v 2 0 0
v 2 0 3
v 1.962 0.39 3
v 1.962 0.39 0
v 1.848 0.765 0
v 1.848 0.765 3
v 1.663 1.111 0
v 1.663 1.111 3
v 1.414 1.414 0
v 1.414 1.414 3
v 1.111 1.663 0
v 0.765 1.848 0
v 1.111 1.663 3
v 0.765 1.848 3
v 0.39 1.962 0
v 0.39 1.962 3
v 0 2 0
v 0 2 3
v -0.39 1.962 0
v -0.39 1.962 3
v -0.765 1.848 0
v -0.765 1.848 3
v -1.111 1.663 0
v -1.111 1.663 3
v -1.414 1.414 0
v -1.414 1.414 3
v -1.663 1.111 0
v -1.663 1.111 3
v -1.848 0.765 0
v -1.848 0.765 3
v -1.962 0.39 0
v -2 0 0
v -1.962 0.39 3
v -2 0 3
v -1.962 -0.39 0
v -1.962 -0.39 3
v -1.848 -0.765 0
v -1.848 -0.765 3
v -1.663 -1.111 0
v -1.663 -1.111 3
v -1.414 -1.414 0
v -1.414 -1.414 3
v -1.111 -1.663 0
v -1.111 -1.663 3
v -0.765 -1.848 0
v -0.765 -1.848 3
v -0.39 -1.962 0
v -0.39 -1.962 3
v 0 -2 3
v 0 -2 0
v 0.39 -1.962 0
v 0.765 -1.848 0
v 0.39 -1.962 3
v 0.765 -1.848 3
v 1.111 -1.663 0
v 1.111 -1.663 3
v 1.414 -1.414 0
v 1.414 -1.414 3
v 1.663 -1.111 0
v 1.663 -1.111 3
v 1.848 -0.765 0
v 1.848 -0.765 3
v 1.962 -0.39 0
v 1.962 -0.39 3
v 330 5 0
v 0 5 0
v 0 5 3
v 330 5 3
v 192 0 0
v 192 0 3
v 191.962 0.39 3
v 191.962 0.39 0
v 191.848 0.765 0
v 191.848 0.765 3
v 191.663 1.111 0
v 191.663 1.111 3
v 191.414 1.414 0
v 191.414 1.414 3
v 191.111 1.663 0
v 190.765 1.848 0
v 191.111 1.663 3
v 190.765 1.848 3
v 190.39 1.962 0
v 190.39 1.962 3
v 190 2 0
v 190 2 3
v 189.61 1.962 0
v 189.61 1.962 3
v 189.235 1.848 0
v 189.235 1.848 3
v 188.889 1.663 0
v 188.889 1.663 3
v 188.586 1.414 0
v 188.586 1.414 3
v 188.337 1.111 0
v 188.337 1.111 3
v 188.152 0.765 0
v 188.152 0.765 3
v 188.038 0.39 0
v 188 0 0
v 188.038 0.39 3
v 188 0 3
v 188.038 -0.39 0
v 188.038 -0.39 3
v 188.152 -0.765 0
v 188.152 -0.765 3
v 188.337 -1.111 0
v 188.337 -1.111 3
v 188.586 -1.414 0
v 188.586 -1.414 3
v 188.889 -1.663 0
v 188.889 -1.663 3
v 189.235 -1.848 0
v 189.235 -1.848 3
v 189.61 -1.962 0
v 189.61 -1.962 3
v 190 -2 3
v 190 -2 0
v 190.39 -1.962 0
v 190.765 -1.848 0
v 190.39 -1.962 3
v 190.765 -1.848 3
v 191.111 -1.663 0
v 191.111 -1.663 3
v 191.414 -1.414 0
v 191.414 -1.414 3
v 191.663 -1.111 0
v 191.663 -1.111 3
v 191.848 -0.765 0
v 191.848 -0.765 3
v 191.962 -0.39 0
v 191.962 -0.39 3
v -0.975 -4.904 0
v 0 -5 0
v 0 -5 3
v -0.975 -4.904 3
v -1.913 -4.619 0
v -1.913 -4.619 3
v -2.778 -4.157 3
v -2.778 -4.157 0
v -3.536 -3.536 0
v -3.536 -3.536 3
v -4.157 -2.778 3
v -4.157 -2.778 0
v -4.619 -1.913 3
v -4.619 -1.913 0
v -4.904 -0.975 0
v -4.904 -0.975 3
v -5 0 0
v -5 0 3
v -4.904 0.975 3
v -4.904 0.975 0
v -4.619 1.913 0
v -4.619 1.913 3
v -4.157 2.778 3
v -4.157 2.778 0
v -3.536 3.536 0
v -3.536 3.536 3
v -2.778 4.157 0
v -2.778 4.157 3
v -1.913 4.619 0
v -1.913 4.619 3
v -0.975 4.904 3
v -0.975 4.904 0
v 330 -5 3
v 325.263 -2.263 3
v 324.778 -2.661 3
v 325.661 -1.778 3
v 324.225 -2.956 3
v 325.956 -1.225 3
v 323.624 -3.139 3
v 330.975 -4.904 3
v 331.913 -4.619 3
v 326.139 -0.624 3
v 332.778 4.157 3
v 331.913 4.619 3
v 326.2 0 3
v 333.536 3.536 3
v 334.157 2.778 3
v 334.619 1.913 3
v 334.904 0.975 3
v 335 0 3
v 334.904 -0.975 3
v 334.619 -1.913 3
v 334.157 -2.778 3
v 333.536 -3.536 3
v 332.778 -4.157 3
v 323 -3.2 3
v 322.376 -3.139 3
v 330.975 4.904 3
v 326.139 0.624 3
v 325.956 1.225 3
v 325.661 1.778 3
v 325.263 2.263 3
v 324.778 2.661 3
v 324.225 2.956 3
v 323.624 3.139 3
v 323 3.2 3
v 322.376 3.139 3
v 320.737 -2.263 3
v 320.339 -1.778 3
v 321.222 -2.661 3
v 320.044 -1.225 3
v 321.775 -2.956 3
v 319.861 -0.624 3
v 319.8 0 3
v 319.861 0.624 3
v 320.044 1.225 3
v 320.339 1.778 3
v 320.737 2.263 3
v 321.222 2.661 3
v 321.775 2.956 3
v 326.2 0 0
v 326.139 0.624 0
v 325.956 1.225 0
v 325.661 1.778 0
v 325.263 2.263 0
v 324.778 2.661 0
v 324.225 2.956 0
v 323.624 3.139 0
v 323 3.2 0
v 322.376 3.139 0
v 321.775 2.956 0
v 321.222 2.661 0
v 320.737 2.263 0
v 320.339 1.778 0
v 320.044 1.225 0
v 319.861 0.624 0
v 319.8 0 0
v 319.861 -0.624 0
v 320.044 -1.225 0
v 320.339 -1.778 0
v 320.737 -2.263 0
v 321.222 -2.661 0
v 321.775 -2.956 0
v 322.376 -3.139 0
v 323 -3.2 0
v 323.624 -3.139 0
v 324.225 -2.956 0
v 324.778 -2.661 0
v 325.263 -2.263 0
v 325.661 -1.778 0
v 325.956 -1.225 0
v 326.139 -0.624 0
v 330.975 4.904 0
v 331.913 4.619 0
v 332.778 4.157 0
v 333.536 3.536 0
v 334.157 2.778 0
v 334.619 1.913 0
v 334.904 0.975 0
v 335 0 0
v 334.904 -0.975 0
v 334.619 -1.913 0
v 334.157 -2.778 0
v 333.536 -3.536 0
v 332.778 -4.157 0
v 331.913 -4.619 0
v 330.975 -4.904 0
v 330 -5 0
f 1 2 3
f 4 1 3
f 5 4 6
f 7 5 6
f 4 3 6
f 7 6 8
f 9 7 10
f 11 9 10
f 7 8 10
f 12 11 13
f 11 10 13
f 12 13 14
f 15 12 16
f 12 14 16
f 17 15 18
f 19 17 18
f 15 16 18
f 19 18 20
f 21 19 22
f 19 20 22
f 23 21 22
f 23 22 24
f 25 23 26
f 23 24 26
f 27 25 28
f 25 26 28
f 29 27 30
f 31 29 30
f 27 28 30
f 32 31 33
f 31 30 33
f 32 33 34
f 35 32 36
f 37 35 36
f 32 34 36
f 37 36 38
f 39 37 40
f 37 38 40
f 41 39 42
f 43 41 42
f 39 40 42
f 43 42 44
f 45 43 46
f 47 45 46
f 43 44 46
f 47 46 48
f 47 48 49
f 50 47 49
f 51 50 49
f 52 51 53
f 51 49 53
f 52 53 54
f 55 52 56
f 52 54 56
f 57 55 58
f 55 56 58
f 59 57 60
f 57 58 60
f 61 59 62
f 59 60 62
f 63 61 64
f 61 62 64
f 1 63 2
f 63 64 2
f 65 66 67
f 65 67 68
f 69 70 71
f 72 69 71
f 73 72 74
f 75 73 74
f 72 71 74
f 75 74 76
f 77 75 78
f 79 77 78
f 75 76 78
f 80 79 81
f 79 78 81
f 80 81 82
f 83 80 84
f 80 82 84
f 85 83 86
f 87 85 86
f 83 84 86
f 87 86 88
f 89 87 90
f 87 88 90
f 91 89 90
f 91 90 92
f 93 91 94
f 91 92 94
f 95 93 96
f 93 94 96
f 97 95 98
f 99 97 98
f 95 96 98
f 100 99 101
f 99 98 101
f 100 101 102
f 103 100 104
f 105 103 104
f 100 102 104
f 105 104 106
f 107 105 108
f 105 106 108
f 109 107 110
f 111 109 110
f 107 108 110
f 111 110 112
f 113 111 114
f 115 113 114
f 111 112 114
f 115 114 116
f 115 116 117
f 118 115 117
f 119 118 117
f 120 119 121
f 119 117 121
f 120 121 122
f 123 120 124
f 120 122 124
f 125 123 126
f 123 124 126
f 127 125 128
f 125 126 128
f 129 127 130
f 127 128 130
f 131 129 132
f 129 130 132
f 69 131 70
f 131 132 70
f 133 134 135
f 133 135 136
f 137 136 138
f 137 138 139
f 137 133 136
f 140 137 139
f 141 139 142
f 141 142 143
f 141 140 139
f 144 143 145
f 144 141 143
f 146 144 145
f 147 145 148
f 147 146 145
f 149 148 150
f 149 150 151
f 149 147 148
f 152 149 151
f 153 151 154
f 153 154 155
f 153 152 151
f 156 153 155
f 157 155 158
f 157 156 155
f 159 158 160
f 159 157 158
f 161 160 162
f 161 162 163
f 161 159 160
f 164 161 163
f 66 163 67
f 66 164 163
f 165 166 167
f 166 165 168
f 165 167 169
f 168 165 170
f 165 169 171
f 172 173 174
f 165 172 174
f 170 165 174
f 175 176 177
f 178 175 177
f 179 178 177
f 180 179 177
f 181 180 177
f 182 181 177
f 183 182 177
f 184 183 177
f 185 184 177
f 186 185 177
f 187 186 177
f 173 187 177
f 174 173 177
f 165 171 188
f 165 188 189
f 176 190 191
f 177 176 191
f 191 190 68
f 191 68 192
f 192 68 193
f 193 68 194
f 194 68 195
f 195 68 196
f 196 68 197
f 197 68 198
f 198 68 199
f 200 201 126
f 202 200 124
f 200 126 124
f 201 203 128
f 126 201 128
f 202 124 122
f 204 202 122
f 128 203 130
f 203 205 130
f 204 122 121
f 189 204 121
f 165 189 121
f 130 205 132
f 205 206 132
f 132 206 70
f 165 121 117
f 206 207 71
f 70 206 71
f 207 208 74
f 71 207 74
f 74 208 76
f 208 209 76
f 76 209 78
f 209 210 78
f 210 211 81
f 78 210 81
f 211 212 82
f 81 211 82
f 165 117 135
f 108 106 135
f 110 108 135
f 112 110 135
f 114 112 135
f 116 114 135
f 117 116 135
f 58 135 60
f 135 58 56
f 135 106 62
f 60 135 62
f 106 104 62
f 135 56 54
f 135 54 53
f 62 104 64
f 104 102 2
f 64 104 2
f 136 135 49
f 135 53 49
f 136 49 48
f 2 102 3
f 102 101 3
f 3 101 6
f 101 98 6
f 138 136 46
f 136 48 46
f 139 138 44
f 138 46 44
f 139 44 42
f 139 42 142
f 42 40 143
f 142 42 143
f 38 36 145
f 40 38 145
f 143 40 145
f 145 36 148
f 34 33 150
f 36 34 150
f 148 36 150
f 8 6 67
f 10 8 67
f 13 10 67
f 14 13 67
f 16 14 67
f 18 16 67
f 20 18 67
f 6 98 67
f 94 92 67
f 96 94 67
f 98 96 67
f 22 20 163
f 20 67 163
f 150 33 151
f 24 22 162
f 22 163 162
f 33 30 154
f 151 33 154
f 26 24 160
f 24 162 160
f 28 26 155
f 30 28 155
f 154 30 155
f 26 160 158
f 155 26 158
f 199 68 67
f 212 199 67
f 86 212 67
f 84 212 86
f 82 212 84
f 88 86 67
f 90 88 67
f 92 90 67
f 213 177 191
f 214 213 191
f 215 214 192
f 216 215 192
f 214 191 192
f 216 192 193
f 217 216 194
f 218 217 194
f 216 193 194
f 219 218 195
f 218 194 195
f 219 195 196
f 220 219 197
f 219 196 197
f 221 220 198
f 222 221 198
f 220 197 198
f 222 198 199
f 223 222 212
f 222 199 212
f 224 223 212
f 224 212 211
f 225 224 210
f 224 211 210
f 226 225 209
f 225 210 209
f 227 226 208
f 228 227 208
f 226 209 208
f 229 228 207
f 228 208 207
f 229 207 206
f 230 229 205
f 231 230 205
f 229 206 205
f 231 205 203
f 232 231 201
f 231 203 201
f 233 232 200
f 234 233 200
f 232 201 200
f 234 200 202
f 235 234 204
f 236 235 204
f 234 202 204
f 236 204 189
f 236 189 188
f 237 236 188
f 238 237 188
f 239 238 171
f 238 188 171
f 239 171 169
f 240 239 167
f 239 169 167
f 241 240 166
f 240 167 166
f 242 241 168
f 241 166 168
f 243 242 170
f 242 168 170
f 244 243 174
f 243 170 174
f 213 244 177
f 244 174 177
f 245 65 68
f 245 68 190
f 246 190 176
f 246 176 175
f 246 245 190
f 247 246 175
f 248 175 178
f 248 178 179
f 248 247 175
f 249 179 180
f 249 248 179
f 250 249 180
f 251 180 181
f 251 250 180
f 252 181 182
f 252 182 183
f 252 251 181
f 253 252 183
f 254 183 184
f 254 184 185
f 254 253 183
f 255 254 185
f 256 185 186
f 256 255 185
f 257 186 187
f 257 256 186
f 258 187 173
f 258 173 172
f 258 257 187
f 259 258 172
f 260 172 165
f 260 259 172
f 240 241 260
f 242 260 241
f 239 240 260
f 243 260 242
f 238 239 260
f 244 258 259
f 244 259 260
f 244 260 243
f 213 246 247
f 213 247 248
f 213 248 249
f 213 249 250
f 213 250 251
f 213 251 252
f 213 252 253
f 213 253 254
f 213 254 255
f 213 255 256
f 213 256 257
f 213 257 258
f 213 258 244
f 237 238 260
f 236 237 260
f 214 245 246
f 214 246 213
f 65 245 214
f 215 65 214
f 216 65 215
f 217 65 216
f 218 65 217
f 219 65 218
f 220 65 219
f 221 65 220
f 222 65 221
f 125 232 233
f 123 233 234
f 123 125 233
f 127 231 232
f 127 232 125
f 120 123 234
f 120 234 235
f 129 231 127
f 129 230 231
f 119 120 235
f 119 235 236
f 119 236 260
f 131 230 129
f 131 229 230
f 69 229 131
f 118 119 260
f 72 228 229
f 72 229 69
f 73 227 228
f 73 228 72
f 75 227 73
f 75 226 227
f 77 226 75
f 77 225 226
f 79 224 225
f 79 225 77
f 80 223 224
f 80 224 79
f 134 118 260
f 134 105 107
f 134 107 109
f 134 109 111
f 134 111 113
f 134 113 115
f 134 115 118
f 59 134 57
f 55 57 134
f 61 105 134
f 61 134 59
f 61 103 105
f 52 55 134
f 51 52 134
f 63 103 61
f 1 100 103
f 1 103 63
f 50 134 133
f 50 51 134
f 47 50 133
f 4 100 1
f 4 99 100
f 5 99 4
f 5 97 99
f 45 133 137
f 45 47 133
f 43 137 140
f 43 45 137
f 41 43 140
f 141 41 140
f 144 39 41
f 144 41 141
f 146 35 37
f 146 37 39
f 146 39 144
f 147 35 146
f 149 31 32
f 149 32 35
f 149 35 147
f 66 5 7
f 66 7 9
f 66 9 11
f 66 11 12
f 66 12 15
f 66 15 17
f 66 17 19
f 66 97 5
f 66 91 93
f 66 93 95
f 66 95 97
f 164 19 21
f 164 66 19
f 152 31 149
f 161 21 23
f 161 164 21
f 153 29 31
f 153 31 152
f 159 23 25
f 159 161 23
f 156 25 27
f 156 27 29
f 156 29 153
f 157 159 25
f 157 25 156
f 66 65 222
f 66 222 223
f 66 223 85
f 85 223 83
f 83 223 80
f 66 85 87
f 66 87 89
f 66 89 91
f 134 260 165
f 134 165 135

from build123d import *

# Parameters (mm, degrees)
BOSS_EXTRUDE1_DEPTH = 3
SKETCH2_R           = 3.2
CUT_EXTRUDE1_DEPTH  = 3
SKETCH5_R           = 2
CUT_EXTRUDE2_DEPTH  = 3
SKETCH10_R          = 2
CUT_EXTRUDE4_DEPTH  = 3


with BuildPart() as part:
    # Sketch1 → Boss-Extrude1 (new body)
    with BuildSketch(Plane.XY):
        with BuildLine():
            Line((0, 5), (330, 5))
            ThreePointArc((330, 5), (335, 0), (330, -5))
            Line((330, -5), (0, -5))
            ThreePointArc((0, -5), (-5, 0), (0, 5))
        make_face()
    extrude(amount=BOSS_EXTRUDE1_DEPTH)

    # Sketch2 → Cut-Extrude1 (cut)
    with BuildSketch(Plane.XY.offset(3)):
        with Locations((323, 0)):
            Circle(SKETCH2_R)
    extrude(amount=-CUT_EXTRUDE1_DEPTH, mode=Mode.SUBTRACT)

    # Sketch5 → Cut-Extrude2 (cut)
    with BuildSketch(Plane.XY.offset(3)):
        with Locations((190, 0)):
            Circle(SKETCH5_R)
    extrude(amount=-CUT_EXTRUDE2_DEPTH, mode=Mode.SUBTRACT)

    # Sketch10 → Cut-Extrude4 (cut)
    with BuildSketch(Plane.XY.offset(3)):
        Circle(SKETCH10_R)
    extrude(amount=-CUT_EXTRUDE4_DEPTH, mode=Mode.SUBTRACT)


solid = part.part
